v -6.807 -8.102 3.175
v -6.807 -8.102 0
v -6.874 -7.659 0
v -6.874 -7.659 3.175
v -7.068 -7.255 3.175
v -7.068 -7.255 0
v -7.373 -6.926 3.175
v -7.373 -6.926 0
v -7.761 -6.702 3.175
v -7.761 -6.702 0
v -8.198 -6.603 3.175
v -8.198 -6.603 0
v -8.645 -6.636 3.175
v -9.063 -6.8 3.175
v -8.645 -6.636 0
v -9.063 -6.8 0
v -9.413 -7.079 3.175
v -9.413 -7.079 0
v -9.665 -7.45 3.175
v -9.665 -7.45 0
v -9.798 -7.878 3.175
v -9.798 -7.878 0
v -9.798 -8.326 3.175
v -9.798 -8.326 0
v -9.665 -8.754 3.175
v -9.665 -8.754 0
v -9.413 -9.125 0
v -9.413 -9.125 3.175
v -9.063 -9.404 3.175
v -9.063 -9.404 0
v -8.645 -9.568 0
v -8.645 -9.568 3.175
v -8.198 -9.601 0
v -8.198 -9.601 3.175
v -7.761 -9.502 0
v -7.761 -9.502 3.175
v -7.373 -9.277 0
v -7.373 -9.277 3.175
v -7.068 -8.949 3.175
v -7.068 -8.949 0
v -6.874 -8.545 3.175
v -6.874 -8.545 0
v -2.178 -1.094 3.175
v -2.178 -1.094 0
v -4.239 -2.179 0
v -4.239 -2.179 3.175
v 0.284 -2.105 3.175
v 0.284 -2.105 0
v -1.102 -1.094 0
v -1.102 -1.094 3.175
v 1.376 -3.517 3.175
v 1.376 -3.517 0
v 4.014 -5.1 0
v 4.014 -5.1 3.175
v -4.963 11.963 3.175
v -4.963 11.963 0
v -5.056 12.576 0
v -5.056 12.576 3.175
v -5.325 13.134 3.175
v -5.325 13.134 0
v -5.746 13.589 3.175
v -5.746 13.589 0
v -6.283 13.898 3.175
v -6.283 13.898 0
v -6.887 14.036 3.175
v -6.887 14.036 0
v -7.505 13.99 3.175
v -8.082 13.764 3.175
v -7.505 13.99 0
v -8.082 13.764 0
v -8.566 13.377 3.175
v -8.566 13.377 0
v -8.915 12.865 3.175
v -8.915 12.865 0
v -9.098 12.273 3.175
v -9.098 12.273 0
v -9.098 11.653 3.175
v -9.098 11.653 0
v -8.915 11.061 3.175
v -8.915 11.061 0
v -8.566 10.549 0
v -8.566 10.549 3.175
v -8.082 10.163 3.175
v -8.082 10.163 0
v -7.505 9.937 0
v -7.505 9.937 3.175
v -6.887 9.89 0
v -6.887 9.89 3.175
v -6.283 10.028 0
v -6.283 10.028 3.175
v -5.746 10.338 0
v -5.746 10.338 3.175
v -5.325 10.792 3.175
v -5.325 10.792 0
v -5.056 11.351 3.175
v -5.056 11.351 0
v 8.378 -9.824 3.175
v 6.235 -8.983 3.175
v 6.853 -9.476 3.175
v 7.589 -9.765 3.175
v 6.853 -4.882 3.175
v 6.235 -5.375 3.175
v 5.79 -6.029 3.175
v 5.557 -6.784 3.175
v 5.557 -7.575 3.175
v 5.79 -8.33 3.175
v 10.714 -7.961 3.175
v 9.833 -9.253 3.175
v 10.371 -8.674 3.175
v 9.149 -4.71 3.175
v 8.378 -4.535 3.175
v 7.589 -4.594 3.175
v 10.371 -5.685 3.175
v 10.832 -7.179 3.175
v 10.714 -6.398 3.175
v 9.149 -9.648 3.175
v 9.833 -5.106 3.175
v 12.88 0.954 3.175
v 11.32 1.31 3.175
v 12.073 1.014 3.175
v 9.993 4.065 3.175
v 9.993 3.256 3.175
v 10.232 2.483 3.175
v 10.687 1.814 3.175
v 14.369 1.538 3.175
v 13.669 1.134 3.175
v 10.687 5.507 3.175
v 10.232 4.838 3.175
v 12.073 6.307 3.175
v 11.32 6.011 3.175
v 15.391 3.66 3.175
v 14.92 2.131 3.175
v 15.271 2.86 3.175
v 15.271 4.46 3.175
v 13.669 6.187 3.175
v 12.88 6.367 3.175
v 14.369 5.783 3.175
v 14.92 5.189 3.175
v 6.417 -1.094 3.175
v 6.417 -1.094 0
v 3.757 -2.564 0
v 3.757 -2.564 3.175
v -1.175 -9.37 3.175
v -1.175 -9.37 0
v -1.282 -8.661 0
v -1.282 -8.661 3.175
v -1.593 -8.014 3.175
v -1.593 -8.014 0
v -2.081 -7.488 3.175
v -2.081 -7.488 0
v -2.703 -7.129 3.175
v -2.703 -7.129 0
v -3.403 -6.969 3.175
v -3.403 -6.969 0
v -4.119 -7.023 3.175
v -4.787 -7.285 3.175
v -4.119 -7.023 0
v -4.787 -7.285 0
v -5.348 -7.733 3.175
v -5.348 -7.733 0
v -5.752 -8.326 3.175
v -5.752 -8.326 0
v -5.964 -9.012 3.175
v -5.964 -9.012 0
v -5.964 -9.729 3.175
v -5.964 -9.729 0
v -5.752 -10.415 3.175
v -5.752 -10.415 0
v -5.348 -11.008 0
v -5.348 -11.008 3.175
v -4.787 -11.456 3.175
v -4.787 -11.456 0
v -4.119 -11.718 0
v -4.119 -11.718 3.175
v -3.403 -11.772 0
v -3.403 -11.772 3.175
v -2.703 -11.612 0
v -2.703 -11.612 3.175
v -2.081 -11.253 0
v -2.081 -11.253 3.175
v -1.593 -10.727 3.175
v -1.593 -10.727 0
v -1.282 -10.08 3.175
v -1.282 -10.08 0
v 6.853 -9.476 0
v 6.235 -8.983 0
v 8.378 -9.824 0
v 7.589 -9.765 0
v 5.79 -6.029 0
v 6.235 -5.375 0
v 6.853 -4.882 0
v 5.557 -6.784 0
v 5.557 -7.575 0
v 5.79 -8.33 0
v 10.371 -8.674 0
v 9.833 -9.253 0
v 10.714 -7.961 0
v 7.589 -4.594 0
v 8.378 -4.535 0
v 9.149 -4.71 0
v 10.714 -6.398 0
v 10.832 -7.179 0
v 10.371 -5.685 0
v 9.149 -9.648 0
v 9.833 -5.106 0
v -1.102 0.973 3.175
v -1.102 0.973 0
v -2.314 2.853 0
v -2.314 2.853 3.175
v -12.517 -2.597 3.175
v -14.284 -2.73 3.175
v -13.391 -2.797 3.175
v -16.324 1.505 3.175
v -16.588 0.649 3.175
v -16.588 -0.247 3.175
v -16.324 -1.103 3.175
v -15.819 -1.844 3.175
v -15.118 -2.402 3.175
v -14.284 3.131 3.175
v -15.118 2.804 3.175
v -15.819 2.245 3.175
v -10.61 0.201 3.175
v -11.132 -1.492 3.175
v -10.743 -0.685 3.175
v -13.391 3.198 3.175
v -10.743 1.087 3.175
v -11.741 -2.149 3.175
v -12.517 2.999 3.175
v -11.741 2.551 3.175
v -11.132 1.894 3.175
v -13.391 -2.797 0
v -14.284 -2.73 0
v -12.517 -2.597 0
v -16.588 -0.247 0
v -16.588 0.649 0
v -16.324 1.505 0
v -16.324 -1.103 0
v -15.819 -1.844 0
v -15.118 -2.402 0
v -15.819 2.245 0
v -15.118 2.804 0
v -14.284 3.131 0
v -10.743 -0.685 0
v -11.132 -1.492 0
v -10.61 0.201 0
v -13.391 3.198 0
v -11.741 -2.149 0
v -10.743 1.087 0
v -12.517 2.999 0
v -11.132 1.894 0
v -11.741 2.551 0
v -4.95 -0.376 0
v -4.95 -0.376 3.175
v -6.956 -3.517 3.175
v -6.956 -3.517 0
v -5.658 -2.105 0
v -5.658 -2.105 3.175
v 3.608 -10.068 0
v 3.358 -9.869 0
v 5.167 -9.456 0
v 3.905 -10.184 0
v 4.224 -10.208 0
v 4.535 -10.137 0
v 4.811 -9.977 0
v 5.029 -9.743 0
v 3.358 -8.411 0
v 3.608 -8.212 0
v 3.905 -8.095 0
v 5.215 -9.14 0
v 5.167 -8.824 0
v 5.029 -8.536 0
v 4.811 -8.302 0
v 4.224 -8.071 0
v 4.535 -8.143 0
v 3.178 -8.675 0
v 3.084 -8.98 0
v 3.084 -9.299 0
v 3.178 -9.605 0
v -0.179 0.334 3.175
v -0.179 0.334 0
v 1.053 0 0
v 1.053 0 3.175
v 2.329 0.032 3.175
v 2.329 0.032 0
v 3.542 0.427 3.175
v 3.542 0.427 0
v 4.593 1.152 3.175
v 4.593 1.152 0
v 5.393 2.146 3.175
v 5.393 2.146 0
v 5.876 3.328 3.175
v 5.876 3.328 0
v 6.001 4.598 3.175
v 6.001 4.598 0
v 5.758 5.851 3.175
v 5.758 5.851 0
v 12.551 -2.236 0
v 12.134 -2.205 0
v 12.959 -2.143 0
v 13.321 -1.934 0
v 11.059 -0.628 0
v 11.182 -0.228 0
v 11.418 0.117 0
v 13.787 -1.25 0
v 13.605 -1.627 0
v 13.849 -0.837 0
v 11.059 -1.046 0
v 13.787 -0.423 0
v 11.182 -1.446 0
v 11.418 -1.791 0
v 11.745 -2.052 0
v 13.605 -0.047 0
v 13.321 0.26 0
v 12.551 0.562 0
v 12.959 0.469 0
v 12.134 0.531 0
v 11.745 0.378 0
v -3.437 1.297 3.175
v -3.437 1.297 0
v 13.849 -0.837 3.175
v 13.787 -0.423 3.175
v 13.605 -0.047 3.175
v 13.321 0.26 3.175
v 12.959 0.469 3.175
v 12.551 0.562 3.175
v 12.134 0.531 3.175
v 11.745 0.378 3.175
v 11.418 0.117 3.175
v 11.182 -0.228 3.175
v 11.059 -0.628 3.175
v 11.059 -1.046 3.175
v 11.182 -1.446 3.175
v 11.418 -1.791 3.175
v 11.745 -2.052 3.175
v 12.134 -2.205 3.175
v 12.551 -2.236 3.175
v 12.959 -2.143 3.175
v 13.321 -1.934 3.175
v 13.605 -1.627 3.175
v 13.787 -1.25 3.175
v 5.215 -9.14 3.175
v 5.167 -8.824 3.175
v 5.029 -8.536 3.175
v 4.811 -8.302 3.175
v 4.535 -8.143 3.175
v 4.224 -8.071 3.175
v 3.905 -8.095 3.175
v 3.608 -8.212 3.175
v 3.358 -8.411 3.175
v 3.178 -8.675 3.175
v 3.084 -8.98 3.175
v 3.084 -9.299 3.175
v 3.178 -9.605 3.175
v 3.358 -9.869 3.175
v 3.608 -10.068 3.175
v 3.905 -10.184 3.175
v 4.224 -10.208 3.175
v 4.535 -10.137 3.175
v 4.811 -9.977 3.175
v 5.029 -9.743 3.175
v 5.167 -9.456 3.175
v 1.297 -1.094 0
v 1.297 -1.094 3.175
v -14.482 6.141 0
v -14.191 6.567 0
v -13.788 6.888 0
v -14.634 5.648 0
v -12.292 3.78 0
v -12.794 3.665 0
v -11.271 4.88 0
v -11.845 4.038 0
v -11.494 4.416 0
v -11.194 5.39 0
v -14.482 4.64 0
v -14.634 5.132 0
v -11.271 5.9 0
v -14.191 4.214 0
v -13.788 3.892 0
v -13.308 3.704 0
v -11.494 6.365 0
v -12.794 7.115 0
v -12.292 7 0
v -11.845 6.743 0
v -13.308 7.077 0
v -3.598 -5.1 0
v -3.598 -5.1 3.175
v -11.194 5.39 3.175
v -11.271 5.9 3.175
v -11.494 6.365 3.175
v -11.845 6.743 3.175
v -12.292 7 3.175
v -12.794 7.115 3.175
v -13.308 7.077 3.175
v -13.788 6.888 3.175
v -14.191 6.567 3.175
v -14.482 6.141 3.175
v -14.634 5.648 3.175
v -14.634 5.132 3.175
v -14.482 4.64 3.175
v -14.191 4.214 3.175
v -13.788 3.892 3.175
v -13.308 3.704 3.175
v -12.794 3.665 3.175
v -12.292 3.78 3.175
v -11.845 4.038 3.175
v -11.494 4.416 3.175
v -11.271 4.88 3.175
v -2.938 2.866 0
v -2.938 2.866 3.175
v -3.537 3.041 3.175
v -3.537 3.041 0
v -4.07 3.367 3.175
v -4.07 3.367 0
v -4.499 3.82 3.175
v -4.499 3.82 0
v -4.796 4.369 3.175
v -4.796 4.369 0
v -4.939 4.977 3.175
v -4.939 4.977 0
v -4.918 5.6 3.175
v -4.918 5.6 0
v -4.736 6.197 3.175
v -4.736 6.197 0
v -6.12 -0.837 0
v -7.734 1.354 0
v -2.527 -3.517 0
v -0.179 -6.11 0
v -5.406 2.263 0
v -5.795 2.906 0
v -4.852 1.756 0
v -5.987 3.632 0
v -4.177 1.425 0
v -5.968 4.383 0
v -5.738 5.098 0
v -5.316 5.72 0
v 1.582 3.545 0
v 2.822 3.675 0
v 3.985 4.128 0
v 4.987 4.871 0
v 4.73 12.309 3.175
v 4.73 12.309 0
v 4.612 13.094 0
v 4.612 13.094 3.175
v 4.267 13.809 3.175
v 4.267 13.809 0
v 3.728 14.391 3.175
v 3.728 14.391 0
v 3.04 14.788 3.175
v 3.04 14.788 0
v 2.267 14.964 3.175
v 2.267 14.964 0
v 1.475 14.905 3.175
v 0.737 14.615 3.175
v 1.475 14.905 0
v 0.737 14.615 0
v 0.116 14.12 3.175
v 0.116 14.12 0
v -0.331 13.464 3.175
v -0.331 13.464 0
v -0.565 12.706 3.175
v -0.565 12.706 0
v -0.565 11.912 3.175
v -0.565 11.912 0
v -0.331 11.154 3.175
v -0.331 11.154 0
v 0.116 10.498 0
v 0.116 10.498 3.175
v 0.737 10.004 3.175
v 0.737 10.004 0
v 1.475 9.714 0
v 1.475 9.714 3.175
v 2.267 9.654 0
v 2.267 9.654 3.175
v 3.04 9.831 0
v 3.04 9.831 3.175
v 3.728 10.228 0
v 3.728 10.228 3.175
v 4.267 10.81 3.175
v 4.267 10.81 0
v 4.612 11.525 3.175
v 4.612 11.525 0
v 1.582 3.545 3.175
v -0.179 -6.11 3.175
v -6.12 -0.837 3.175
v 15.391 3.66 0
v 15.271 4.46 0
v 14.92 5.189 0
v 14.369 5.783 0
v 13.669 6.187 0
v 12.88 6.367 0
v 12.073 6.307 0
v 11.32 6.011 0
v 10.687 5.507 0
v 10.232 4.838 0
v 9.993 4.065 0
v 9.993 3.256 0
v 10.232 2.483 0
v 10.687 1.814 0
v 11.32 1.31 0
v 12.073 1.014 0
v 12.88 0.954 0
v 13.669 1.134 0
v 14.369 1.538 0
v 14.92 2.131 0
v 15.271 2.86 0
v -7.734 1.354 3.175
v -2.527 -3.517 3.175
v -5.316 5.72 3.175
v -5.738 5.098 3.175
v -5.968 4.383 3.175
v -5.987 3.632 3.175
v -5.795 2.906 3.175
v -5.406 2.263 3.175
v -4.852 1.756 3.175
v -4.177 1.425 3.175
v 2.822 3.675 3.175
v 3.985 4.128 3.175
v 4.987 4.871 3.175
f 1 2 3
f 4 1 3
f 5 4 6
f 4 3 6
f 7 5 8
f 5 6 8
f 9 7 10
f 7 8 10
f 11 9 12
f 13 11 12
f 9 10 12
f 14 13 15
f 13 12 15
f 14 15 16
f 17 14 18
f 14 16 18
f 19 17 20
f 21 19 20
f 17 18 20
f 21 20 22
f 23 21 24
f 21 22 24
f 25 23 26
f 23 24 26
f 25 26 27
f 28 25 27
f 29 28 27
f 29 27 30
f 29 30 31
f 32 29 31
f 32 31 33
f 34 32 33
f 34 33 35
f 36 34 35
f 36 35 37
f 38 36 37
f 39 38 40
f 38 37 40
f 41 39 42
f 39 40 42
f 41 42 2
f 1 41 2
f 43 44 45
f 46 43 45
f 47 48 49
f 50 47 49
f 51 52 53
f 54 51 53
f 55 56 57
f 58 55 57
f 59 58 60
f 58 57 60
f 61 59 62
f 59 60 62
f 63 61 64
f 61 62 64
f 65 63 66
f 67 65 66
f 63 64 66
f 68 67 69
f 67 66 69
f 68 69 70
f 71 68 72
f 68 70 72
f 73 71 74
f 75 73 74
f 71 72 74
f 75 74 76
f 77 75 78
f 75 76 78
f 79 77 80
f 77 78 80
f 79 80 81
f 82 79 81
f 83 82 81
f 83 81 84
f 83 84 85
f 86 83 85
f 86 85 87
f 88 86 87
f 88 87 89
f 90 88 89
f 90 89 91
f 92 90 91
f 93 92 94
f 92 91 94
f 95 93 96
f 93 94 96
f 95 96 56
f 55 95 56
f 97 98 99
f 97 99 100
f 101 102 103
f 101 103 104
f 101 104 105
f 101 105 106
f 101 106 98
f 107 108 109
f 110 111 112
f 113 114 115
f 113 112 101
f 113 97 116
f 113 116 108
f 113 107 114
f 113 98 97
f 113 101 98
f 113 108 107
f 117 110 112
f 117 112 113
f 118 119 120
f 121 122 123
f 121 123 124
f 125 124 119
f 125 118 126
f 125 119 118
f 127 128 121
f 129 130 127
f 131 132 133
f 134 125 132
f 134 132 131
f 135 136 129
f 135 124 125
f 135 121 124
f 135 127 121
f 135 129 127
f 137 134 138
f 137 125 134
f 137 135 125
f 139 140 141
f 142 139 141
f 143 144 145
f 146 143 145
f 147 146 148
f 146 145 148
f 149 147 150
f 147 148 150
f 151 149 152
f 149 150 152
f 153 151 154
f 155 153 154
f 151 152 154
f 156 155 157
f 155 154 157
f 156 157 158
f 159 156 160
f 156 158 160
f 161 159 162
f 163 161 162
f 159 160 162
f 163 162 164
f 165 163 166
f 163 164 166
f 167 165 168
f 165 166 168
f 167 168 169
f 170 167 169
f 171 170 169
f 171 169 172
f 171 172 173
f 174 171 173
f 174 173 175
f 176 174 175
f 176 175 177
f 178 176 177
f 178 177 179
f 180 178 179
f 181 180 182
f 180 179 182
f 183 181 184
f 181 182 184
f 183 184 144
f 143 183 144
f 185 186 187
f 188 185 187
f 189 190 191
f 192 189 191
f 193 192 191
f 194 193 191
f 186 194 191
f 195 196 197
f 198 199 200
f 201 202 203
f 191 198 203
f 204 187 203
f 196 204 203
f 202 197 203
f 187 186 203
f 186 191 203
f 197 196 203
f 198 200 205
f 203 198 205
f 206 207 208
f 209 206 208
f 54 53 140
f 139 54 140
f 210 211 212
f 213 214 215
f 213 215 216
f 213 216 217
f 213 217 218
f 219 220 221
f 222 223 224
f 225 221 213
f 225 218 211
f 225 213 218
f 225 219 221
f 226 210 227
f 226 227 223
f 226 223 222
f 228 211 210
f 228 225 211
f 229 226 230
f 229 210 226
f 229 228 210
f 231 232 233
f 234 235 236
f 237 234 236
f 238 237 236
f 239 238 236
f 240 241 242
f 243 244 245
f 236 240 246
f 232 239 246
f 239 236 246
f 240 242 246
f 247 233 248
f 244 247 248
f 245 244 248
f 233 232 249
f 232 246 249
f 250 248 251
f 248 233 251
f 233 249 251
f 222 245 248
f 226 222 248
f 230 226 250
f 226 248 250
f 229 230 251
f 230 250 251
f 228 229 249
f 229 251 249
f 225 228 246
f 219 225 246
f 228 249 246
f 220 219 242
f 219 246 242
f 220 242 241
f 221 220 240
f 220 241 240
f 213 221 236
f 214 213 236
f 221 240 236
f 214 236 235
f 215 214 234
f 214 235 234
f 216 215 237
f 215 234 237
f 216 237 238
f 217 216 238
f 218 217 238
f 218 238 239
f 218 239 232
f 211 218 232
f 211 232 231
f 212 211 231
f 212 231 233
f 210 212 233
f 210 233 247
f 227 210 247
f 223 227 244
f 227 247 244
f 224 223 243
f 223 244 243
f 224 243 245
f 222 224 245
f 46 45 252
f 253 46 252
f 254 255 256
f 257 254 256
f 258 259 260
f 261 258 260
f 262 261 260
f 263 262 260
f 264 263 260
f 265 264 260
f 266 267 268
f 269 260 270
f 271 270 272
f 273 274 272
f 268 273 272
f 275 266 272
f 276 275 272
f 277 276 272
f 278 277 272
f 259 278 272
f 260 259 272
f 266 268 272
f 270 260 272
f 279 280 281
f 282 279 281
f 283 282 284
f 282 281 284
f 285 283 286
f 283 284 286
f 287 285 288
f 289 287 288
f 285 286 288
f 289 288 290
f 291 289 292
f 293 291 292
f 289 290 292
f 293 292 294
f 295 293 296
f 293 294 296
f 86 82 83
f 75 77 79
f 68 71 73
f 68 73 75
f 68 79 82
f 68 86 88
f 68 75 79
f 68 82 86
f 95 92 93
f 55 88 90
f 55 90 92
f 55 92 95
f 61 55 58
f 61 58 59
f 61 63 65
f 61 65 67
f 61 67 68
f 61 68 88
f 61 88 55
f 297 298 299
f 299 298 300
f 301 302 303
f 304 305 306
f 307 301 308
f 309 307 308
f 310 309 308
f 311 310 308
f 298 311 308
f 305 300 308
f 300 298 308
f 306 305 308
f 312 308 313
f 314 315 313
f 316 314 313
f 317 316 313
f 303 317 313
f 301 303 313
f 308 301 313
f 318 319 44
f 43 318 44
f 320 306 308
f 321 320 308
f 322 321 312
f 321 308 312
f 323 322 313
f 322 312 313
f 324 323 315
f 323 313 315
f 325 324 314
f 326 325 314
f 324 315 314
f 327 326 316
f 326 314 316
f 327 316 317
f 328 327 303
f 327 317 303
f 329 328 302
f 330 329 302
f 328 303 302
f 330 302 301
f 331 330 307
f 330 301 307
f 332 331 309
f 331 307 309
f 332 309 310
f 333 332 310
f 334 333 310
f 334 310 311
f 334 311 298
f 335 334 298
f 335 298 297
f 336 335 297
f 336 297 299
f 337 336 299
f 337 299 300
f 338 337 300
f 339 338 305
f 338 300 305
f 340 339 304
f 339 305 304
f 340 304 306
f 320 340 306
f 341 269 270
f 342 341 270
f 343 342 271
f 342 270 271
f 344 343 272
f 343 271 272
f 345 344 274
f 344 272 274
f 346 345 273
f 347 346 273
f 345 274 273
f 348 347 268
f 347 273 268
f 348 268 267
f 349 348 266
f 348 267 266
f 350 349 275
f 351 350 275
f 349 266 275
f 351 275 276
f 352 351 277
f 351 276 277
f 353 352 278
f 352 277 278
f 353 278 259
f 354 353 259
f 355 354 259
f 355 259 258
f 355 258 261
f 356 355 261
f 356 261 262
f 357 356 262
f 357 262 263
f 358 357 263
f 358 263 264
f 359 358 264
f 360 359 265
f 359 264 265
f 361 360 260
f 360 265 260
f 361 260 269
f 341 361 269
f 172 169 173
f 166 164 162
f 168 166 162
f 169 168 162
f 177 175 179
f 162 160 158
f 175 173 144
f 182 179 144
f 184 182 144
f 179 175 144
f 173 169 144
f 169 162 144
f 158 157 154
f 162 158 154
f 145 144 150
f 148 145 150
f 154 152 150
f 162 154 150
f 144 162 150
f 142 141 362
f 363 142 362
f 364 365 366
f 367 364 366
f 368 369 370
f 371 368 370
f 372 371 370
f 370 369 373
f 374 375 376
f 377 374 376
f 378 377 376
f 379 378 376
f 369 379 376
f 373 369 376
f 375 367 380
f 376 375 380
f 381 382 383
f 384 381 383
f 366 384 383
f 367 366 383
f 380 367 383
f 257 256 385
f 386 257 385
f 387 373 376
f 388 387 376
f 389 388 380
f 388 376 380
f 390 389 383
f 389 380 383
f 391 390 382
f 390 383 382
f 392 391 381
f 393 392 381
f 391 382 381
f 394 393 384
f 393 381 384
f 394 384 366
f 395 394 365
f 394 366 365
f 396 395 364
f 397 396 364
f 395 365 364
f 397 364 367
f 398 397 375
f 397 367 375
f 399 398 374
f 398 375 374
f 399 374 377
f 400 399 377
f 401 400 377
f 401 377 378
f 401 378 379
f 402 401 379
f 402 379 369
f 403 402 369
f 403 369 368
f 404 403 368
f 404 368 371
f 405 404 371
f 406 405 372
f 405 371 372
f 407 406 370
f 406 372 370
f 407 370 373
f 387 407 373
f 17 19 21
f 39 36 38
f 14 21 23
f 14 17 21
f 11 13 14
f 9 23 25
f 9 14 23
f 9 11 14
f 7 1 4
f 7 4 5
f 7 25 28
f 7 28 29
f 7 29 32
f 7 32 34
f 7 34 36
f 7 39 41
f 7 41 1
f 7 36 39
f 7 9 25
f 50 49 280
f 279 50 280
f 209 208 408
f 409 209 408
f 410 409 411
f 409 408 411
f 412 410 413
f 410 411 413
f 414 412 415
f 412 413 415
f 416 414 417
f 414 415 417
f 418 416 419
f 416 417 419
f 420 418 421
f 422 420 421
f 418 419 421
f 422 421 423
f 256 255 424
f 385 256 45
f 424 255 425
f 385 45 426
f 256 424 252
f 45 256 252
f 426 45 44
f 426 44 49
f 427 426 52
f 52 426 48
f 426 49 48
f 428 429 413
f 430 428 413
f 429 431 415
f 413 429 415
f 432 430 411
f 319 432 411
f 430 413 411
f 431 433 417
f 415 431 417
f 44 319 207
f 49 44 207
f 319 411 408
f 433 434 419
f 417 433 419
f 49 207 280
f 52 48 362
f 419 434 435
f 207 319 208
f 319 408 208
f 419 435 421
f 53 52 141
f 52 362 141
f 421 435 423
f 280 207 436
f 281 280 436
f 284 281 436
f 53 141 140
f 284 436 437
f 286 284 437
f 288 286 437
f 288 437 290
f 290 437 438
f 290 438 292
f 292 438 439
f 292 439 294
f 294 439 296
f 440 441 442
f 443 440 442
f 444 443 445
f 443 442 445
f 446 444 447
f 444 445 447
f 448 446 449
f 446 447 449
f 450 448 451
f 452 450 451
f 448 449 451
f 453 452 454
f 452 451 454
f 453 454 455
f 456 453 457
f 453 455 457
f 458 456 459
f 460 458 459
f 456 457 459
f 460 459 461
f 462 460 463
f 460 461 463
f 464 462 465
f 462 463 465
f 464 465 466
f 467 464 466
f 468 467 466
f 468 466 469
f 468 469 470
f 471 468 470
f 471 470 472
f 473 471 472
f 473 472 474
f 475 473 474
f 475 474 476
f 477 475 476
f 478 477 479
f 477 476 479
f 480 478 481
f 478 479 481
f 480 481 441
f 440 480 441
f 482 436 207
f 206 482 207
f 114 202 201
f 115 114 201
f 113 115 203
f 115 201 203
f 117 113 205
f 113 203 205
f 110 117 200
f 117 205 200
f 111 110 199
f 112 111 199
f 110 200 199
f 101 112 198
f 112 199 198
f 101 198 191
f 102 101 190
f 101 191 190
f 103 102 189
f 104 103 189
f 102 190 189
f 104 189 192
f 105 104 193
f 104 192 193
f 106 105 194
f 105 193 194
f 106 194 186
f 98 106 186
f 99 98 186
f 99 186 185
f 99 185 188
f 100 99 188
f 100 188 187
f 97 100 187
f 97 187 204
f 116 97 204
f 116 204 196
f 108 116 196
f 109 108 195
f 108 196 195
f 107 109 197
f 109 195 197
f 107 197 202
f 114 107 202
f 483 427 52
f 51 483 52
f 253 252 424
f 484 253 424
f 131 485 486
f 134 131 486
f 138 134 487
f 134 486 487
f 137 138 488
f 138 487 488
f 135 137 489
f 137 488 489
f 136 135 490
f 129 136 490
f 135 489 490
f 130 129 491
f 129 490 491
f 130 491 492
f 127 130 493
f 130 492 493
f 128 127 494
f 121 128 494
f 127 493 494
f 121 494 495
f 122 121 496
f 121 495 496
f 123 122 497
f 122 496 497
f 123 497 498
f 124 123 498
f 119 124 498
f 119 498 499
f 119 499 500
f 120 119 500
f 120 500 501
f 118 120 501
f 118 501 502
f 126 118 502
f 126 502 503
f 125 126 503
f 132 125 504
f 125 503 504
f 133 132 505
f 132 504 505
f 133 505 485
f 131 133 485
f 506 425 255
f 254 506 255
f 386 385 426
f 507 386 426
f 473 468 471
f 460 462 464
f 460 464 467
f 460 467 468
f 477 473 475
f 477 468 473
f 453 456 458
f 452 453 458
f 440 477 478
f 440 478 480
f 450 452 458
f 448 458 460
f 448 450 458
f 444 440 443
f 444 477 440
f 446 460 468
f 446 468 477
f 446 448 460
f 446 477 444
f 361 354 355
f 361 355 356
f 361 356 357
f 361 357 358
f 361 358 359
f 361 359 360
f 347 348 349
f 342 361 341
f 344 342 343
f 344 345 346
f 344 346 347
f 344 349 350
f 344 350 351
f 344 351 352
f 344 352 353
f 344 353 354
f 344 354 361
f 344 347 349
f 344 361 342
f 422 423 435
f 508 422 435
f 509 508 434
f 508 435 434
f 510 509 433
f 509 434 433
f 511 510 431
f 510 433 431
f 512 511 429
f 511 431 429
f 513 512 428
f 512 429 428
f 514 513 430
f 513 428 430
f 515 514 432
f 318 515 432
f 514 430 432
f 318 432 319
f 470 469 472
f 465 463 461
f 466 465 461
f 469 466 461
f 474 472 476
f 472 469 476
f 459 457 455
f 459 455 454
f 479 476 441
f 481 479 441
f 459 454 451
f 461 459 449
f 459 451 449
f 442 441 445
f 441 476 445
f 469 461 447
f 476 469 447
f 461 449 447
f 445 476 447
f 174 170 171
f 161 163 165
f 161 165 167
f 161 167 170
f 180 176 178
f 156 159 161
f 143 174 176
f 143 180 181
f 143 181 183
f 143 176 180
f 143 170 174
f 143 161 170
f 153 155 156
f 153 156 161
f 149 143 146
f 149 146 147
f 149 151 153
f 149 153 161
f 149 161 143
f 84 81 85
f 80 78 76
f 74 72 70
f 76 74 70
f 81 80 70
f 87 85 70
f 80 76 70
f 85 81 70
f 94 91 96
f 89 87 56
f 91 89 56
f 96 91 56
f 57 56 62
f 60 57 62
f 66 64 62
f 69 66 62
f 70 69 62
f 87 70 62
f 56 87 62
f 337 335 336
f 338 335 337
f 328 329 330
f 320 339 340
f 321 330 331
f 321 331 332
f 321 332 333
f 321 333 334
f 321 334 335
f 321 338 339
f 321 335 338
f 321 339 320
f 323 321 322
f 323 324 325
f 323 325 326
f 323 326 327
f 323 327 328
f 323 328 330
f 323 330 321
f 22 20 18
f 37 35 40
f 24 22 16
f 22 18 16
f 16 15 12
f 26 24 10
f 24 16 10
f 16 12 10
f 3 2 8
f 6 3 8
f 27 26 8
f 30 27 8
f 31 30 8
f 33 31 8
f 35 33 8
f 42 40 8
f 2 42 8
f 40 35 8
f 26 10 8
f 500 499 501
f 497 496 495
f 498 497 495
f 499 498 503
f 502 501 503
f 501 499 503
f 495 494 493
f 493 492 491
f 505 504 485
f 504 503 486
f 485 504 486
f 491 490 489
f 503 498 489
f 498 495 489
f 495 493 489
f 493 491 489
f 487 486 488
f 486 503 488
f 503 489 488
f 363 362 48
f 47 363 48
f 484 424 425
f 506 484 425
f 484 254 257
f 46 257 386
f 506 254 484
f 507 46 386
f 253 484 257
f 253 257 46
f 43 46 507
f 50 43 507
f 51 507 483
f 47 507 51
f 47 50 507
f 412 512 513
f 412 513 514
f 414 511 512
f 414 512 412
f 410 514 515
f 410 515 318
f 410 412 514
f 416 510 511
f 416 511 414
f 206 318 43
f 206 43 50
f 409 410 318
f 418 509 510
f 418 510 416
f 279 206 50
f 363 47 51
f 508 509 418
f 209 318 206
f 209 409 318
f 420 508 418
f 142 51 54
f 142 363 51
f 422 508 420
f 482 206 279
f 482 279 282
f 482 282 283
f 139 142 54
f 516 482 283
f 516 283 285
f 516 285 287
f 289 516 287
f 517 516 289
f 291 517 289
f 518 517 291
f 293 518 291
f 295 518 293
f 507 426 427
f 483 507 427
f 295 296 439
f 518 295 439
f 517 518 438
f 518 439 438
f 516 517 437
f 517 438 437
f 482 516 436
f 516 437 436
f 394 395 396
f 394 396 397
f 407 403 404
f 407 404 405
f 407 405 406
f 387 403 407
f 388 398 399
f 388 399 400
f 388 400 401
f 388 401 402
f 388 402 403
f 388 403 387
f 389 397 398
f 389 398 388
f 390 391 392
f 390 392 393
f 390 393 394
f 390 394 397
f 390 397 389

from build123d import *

# Parameters (mm, degrees)
F1_DEPTH = 3.175
F0_R     = 3.0058400938
F0_R_2   = 1.7297628863
F0_R_3   = 2.0789147202
F0_R_4   = 2.6623124831
F0_R_5   = 2.7142518638
F0_R_6   = 1.4028991856
F0_R_7   = 2.6523027823
F0_R_8   = 1.0713376485
F0_R_9   = 2.4079005593
F0_R_10  = 1.503555761


# Not quite as in the source:
# - a feature names something its author has since deleted; it is built from what else it names


with BuildPart() as f1:
    # F0 (on Top) → F1 (new body)
    with BuildSketch(Plane.XY):
        with BuildLine():
            Line((-6.1197558618, -0.8369509036), (-7.7342026882, 1.354082565))
            Line((-7.7342026882, 1.354082565), (-6.9561327472, -3.5171294496))
            Line((-6.9561327472, -3.5171294496), (-5.6584882394, -2.105442362))
            Line((-5.6584882394, -2.105442362), (-3.5983910284, -5.0996665728))
            Line((-3.5983910284, -5.0996665728), (-2.5265401718, -3.5171294496))
            Line((-2.5265401718, -3.5171294496), (-0.1793996592, -6.1098384625))
            Line((-0.1793996592, -6.1098384625), (1.3758814801, -3.5171294496))
            Line((1.3758814801, -3.5171294496), (4.0140271882, -5.0996665728))
            Line((4.0140271882, -5.0996665728), (6.4169475934, -1.0939127355))
            Line((6.4169475934, -1.0939127355), (3.7565478899, -2.5639539262))
            Line((3.7565478899, -2.5639539262), (1.296967469, -1.0939127355))
            Line((1.296967469, -1.0939127355), (0.2841313167, -2.105442362))
            Line((0.2841313167, -2.105442362), (-1.1021959199, -1.0939127355))
            Line((-1.1021959199, -1.0939127355), (-0.1793996592, 0.3343850841))
            ThreePointArc((-0.1793996592, 0.3343850841), (4.5929798172, 1.1518206005), (5.7579467259, 5.8514651393))
            ThreePointArc((5.7579467259, 5.8514651393), (3.9849443716, 4.1276898045), (1.5817080986, 3.5451143423))
            Line((1.5817080986, 3.5451143423), (-1.1021959199, 0.9732797643))
            Line((-1.1021959199, 0.9732797643), (-2.3142797951, 2.8532103717))
            ThreePointArc((-2.3142797951, 2.8532103717), (-4.499498148, 3.8197245452), (-4.735944538, 6.1974171246))
            ThreePointArc((-4.735944538, 6.1974171246), (-5.9170454131, 3.2620282391), (-3.4369527023, 1.2971752339))
            Line((-3.4369527023, 1.2971752339), (-2.1779222215, -1.0939127355))
            Line((-2.1779222215, -1.0939127355), (-4.2390126121, -2.1791825618))
            Line((-4.2390126121, -2.1791825618), (-4.9504833449, -0.3756800361))
            Line((-4.9504833449, -0.3756800361), (-6.1197558618, -0.8369509036))
        make_face()
    extrude(amount=F1_DEPTH)


with BuildPart() as f1b:
    # F0 (on Top) → F1, piece 2 (new body)
    with BuildSketch(Plane.XY):
        with Locations((-13.6153940494, 0.2009075893)):
            Circle(F0_R)
    extrude(amount=F1_DEPTH)


with BuildPart() as f1c:
    # F0 (on Top) → F1, piece 3 (new body)
    with BuildSketch(Plane.XY):
        with Locations((-12.9234905016, 5.3901949799)):
            Circle(F0_R_2)
    extrude(amount=F1_DEPTH)


with BuildPart() as f1d:
    # F0 (on Top) → F1, piece 4 (new body)
    with BuildSketch(Plane.XY):
        with Locations((-7.0422970263, 11.9632928487)):
            Circle(F0_R_3)
    extrude(amount=F1_DEPTH)


with BuildPart() as f1e:
    # F0 (on Top) → F1, piece 5 (new body)
    with BuildSketch(Plane.XY):
        with Locations((2.0677854507, 12.3092456796)):
            Circle(F0_R_4)
    extrude(amount=F1_DEPTH)


with BuildPart() as f1f:
    # F0 (on Top) → F1, piece 6 (new body)
    with BuildSketch(Plane.XY):
        with Locations((12.6769982713, 3.6604325164)):
            Circle(F0_R_5)
    extrude(amount=F1_DEPTH)


with BuildPart() as f1g:
    # F0 (on Top) → F1, piece 7 (new body)
    with BuildSketch(Plane.XY):
        with Locations((12.4463619232, -0.8369509036)):
            Circle(F0_R_6)
    extrude(amount=F1_DEPTH)


with BuildPart() as f1h:
    # F0 (on Top) → F1, piece 8 (new body)
    with BuildSketch(Plane.XY):
        with Locations((8.1796131601, -7.1794132698)):
            Circle(F0_R_7)
    extrude(amount=F1_DEPTH)


with BuildPart() as f1i:
    # F0 (on Top) → F1, piece 9 (new body)
    with BuildSketch(Plane.XY):
        with Locations((4.1434990539, -9.1398103902)):
            Circle(F0_R_8)
    extrude(amount=F1_DEPTH)


with BuildPart() as f1j:
    # F0 (on Top) → F1, piece 10 (new body)
    with BuildSketch(Plane.XY):
        with Locations((-3.5827695623, -9.3704450471)):
            Circle(F0_R_9)
    extrude(amount=F1_DEPTH)


with BuildPart() as f1k:
    # F0 (on Top) → F1, piece 11 (new body)
    with BuildSketch(Plane.XY):
        with Locations((-8.3107901761, -8.1019535886)):
            Circle(F0_R_10)
    extrude(amount=F1_DEPTH)


solid = Compound([f1.part, f1b.part, f1c.part, f1d.part, f1e.part, f1f.part, f1g.part, f1h.part, f1i.part, f1j.part, f1k.part])
